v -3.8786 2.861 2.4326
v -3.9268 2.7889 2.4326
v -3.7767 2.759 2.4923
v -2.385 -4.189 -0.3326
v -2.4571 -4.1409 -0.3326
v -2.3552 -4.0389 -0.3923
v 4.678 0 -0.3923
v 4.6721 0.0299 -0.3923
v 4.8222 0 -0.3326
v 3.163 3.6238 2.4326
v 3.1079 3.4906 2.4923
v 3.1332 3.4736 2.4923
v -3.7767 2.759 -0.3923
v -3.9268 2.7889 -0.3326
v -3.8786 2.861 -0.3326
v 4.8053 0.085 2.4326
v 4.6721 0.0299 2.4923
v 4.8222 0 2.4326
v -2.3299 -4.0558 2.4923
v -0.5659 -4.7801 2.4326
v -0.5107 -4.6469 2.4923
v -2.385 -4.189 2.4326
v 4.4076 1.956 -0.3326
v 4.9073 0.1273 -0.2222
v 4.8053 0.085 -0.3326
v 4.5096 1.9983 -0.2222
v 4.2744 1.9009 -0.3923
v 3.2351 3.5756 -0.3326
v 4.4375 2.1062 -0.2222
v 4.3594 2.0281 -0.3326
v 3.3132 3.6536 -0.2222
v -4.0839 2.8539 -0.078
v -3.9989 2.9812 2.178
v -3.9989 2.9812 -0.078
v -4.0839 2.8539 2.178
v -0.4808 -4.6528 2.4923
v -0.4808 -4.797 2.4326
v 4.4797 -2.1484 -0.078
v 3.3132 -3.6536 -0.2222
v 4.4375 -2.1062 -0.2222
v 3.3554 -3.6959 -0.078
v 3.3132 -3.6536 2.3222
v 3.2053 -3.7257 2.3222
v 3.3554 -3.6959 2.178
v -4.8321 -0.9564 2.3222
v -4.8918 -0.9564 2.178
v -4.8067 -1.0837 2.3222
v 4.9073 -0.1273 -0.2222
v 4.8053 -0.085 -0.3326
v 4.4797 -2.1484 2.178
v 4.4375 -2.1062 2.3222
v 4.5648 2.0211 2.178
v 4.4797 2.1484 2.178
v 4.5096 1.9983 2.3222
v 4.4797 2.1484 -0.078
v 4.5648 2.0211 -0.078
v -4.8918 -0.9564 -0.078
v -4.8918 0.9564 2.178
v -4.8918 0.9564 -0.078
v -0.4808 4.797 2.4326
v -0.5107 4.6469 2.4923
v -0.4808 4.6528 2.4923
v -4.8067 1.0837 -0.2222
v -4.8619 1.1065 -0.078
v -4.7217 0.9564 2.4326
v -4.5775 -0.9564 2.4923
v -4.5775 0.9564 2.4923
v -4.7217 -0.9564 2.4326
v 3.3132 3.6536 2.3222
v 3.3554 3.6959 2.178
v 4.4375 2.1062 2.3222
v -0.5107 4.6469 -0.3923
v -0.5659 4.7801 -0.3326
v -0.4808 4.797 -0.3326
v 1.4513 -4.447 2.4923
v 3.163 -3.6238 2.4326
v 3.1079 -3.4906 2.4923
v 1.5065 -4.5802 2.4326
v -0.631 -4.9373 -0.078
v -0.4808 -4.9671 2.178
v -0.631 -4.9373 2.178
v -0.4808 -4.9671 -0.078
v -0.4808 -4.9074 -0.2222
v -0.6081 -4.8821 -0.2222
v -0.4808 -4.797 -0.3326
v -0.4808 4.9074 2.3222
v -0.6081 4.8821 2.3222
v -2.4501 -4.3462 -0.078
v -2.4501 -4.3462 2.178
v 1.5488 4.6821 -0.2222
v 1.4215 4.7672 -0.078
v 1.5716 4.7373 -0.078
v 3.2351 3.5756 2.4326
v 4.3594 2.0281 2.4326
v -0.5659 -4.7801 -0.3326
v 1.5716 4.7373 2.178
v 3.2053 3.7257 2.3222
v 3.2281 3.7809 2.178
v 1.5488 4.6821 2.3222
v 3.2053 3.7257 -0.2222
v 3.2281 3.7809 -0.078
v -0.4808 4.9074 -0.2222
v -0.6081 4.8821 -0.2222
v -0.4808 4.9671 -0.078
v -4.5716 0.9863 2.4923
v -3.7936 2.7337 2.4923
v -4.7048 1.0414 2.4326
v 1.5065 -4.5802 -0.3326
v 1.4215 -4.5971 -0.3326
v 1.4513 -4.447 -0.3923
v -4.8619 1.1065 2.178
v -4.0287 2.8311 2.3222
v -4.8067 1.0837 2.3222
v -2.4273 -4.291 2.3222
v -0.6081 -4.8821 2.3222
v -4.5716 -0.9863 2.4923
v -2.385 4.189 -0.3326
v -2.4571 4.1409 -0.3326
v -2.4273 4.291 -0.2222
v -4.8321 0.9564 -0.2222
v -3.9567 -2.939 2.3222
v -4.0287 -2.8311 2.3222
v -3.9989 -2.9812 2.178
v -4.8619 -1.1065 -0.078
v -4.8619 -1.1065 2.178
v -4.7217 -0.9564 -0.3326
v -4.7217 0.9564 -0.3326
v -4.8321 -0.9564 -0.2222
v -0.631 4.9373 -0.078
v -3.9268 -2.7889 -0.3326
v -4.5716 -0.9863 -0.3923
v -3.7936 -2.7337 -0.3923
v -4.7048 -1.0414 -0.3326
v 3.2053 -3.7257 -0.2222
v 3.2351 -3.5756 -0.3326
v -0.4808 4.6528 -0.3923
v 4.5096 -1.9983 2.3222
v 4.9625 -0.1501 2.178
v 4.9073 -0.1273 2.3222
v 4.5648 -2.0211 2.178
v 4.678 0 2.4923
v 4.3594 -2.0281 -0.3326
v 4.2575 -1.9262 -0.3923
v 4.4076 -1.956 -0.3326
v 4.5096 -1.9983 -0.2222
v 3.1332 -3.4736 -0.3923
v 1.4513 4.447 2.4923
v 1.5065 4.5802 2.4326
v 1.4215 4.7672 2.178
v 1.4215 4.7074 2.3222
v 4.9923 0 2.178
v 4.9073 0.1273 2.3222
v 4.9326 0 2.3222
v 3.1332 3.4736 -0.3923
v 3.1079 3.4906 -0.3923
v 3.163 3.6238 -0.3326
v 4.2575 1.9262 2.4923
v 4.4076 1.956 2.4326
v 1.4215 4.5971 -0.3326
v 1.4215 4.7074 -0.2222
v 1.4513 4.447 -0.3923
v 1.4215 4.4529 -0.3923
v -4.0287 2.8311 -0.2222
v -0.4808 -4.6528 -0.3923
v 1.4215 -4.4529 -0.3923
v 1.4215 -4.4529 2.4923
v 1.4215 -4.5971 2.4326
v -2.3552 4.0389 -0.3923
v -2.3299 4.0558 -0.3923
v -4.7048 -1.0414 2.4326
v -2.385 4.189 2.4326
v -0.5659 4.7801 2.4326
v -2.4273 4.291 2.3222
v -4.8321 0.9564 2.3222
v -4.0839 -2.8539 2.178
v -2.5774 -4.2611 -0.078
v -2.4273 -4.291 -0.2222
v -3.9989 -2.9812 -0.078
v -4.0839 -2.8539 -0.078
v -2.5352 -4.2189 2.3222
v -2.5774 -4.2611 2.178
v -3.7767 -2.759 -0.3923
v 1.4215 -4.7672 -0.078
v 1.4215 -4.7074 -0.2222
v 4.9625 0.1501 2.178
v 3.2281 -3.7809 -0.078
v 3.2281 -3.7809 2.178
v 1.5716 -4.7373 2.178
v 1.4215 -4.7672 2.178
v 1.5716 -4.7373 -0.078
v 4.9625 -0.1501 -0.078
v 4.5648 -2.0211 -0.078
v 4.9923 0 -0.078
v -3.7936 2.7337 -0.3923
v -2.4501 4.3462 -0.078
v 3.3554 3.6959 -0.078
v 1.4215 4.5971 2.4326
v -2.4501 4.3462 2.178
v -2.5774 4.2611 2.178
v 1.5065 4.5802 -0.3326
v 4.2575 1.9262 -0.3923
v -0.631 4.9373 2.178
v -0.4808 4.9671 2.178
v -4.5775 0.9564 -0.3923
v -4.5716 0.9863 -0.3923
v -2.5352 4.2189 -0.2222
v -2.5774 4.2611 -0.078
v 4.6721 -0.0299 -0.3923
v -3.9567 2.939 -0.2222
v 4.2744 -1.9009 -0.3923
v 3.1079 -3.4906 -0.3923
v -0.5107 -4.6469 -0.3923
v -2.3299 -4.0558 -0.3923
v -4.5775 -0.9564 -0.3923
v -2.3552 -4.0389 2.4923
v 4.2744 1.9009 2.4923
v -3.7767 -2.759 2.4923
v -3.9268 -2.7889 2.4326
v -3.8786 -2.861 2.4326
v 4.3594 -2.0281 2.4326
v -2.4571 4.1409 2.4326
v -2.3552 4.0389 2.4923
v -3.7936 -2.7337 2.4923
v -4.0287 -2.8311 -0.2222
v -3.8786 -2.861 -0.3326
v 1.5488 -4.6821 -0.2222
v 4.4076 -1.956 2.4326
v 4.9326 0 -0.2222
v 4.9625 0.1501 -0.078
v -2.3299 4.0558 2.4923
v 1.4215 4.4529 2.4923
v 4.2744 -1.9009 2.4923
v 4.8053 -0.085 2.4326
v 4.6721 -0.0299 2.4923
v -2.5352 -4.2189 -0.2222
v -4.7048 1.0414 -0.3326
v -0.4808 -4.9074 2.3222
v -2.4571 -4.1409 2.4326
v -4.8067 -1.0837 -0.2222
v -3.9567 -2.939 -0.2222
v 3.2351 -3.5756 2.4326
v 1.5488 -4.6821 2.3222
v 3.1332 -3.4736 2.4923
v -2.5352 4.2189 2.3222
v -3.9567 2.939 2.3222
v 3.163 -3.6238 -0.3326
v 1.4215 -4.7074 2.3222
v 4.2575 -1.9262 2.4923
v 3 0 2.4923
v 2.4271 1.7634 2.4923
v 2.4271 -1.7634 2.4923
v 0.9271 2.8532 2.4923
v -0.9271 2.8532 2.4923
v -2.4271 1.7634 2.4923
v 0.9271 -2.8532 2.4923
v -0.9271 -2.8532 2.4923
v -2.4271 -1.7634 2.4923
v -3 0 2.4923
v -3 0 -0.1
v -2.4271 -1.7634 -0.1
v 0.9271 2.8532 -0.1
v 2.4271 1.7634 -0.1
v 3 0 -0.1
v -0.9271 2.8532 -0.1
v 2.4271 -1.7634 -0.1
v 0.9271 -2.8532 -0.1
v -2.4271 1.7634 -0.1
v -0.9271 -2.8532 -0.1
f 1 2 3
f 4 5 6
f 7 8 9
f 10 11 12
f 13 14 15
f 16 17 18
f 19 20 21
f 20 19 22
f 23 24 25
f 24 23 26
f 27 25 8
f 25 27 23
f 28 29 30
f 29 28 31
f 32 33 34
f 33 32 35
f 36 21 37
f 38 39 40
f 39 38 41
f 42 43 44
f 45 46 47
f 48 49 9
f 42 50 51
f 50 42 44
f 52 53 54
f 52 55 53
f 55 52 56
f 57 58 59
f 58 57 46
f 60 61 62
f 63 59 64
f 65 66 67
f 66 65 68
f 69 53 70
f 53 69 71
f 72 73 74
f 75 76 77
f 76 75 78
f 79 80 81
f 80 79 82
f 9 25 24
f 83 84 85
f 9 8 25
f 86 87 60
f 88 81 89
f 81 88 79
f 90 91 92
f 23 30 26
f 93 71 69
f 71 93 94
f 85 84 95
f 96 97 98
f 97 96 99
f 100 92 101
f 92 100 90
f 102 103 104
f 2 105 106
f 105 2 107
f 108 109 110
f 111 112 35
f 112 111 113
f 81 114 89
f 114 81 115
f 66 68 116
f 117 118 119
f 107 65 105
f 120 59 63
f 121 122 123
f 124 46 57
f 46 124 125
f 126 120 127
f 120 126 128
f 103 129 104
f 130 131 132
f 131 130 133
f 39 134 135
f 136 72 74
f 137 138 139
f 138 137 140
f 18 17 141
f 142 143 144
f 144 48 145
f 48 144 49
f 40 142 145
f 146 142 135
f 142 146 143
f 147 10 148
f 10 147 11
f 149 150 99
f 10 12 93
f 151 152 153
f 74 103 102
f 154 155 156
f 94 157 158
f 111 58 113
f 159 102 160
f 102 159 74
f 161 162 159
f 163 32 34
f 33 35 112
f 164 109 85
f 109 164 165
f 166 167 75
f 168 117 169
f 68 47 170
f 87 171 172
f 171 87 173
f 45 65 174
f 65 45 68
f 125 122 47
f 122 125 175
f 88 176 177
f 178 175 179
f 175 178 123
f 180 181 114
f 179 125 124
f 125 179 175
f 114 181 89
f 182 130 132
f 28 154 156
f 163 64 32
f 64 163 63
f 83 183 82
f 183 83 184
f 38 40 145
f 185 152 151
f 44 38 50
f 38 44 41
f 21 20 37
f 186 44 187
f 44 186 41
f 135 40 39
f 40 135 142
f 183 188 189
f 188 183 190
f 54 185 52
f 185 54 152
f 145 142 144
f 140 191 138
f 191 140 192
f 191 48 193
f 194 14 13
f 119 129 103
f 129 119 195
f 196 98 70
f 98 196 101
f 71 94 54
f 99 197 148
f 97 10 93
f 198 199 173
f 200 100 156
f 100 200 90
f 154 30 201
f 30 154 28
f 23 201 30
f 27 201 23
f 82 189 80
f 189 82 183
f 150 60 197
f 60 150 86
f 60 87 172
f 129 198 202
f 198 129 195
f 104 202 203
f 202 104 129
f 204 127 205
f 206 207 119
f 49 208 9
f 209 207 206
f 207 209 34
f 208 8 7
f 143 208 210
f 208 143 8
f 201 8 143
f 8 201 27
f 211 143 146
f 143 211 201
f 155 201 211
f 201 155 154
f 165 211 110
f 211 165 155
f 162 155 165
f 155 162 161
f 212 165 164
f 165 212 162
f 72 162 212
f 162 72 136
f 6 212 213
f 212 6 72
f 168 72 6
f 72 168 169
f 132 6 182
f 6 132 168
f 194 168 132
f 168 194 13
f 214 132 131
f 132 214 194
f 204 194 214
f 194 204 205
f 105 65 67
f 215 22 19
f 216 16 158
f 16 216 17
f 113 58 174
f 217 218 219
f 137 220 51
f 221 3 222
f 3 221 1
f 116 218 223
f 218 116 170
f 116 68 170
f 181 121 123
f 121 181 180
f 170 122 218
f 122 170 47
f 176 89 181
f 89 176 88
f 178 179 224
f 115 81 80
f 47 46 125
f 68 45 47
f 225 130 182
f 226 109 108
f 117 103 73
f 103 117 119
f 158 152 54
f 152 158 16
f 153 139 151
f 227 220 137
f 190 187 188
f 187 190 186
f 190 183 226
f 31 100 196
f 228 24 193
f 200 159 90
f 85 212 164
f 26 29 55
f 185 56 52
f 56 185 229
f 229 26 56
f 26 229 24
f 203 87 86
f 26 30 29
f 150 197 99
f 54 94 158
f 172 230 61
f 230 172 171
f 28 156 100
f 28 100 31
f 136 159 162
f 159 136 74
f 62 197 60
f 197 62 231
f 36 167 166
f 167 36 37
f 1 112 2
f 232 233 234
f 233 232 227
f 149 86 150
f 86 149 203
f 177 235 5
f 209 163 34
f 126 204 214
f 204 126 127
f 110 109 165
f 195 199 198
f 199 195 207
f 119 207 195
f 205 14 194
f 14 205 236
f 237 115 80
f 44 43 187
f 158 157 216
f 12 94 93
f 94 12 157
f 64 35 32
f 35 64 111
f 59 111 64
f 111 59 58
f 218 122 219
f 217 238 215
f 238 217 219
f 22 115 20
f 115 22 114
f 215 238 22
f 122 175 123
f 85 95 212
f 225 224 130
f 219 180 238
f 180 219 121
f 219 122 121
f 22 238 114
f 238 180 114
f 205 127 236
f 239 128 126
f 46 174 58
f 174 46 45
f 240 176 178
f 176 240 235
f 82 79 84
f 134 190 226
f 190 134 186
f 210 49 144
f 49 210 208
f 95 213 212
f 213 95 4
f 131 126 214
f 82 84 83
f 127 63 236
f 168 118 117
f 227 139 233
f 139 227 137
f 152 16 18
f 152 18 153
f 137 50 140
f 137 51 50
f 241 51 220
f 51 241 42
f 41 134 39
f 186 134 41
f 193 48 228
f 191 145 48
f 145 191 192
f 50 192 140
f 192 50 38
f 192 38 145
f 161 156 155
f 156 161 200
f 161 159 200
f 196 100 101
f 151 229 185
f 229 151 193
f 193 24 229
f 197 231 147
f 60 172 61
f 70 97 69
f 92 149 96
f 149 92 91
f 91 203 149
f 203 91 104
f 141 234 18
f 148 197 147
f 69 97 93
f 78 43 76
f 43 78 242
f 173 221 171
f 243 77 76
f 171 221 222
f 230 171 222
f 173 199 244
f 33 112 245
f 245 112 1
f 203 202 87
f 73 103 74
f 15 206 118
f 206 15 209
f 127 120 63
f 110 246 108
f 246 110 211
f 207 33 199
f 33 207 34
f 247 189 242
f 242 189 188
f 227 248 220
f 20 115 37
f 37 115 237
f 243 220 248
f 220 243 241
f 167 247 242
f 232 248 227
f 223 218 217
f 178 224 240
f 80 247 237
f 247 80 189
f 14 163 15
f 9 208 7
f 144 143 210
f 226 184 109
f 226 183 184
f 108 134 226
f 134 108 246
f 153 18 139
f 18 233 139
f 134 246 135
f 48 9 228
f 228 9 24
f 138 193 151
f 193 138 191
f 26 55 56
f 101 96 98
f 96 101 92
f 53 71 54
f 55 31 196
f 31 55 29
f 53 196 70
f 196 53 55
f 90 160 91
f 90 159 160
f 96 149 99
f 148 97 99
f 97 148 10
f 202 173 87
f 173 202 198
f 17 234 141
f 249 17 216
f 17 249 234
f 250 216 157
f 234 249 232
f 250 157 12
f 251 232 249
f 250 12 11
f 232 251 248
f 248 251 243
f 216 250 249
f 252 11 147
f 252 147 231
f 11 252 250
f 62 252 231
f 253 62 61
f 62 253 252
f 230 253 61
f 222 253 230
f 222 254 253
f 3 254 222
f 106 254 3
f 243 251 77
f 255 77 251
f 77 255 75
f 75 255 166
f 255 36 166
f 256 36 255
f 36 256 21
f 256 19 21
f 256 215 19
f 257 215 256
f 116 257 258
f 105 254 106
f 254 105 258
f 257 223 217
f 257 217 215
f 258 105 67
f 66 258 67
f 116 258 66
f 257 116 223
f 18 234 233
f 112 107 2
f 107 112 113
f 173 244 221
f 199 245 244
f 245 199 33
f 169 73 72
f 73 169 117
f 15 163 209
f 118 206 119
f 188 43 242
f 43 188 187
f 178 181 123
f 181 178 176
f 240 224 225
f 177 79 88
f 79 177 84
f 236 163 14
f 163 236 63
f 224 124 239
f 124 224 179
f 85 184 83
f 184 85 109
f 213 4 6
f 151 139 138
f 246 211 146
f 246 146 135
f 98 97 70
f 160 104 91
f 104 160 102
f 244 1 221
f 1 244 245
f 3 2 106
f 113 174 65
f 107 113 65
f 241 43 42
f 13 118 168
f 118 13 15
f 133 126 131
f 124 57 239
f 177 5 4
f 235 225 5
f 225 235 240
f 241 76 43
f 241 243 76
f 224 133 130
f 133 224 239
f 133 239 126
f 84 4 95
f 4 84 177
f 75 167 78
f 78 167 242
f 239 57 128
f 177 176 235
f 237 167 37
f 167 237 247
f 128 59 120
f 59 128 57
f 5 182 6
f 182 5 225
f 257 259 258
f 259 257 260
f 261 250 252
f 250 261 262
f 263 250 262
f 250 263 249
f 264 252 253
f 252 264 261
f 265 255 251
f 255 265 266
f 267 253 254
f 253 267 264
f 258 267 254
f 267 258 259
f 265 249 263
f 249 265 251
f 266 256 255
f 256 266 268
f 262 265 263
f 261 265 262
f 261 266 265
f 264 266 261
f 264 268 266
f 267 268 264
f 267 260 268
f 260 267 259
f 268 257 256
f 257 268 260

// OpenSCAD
// studs/washer.scad — flat ring with a through-hole.
// MIT licensed.
//
// Industrial set. The "negative space" stud — when massed, reads as a row of
// loose washers riveted to the band. Pairs especially well with multi-color
// prints where the hole exposes a different layer color.

module stud_washer(size = 6, tip_radius = 0.4, height = undef) {
    h        = is_undef(height) ? size * 0.25 : height;
    outer_r  = size / 2;
    inner_r  = size * 0.30;
    fillet   = min(tip_radius, h * 0.4);

    difference() {
        if (fillet > 0) {
            minkowski() {
                cylinder(h = max(h - fillet, 0.01), r = outer_r - fillet);
                sphere(r = fillet, $fn = 16);
            }
        } else {
            cylinder(h = h, r = outer_r);
        }
        // through-hole; small overlap so the boolean is clean
        translate([0, 0, -0.1])
            cylinder(h = h + 0.2, r = inner_r);
    }
}

stud_washer(size = 10);
